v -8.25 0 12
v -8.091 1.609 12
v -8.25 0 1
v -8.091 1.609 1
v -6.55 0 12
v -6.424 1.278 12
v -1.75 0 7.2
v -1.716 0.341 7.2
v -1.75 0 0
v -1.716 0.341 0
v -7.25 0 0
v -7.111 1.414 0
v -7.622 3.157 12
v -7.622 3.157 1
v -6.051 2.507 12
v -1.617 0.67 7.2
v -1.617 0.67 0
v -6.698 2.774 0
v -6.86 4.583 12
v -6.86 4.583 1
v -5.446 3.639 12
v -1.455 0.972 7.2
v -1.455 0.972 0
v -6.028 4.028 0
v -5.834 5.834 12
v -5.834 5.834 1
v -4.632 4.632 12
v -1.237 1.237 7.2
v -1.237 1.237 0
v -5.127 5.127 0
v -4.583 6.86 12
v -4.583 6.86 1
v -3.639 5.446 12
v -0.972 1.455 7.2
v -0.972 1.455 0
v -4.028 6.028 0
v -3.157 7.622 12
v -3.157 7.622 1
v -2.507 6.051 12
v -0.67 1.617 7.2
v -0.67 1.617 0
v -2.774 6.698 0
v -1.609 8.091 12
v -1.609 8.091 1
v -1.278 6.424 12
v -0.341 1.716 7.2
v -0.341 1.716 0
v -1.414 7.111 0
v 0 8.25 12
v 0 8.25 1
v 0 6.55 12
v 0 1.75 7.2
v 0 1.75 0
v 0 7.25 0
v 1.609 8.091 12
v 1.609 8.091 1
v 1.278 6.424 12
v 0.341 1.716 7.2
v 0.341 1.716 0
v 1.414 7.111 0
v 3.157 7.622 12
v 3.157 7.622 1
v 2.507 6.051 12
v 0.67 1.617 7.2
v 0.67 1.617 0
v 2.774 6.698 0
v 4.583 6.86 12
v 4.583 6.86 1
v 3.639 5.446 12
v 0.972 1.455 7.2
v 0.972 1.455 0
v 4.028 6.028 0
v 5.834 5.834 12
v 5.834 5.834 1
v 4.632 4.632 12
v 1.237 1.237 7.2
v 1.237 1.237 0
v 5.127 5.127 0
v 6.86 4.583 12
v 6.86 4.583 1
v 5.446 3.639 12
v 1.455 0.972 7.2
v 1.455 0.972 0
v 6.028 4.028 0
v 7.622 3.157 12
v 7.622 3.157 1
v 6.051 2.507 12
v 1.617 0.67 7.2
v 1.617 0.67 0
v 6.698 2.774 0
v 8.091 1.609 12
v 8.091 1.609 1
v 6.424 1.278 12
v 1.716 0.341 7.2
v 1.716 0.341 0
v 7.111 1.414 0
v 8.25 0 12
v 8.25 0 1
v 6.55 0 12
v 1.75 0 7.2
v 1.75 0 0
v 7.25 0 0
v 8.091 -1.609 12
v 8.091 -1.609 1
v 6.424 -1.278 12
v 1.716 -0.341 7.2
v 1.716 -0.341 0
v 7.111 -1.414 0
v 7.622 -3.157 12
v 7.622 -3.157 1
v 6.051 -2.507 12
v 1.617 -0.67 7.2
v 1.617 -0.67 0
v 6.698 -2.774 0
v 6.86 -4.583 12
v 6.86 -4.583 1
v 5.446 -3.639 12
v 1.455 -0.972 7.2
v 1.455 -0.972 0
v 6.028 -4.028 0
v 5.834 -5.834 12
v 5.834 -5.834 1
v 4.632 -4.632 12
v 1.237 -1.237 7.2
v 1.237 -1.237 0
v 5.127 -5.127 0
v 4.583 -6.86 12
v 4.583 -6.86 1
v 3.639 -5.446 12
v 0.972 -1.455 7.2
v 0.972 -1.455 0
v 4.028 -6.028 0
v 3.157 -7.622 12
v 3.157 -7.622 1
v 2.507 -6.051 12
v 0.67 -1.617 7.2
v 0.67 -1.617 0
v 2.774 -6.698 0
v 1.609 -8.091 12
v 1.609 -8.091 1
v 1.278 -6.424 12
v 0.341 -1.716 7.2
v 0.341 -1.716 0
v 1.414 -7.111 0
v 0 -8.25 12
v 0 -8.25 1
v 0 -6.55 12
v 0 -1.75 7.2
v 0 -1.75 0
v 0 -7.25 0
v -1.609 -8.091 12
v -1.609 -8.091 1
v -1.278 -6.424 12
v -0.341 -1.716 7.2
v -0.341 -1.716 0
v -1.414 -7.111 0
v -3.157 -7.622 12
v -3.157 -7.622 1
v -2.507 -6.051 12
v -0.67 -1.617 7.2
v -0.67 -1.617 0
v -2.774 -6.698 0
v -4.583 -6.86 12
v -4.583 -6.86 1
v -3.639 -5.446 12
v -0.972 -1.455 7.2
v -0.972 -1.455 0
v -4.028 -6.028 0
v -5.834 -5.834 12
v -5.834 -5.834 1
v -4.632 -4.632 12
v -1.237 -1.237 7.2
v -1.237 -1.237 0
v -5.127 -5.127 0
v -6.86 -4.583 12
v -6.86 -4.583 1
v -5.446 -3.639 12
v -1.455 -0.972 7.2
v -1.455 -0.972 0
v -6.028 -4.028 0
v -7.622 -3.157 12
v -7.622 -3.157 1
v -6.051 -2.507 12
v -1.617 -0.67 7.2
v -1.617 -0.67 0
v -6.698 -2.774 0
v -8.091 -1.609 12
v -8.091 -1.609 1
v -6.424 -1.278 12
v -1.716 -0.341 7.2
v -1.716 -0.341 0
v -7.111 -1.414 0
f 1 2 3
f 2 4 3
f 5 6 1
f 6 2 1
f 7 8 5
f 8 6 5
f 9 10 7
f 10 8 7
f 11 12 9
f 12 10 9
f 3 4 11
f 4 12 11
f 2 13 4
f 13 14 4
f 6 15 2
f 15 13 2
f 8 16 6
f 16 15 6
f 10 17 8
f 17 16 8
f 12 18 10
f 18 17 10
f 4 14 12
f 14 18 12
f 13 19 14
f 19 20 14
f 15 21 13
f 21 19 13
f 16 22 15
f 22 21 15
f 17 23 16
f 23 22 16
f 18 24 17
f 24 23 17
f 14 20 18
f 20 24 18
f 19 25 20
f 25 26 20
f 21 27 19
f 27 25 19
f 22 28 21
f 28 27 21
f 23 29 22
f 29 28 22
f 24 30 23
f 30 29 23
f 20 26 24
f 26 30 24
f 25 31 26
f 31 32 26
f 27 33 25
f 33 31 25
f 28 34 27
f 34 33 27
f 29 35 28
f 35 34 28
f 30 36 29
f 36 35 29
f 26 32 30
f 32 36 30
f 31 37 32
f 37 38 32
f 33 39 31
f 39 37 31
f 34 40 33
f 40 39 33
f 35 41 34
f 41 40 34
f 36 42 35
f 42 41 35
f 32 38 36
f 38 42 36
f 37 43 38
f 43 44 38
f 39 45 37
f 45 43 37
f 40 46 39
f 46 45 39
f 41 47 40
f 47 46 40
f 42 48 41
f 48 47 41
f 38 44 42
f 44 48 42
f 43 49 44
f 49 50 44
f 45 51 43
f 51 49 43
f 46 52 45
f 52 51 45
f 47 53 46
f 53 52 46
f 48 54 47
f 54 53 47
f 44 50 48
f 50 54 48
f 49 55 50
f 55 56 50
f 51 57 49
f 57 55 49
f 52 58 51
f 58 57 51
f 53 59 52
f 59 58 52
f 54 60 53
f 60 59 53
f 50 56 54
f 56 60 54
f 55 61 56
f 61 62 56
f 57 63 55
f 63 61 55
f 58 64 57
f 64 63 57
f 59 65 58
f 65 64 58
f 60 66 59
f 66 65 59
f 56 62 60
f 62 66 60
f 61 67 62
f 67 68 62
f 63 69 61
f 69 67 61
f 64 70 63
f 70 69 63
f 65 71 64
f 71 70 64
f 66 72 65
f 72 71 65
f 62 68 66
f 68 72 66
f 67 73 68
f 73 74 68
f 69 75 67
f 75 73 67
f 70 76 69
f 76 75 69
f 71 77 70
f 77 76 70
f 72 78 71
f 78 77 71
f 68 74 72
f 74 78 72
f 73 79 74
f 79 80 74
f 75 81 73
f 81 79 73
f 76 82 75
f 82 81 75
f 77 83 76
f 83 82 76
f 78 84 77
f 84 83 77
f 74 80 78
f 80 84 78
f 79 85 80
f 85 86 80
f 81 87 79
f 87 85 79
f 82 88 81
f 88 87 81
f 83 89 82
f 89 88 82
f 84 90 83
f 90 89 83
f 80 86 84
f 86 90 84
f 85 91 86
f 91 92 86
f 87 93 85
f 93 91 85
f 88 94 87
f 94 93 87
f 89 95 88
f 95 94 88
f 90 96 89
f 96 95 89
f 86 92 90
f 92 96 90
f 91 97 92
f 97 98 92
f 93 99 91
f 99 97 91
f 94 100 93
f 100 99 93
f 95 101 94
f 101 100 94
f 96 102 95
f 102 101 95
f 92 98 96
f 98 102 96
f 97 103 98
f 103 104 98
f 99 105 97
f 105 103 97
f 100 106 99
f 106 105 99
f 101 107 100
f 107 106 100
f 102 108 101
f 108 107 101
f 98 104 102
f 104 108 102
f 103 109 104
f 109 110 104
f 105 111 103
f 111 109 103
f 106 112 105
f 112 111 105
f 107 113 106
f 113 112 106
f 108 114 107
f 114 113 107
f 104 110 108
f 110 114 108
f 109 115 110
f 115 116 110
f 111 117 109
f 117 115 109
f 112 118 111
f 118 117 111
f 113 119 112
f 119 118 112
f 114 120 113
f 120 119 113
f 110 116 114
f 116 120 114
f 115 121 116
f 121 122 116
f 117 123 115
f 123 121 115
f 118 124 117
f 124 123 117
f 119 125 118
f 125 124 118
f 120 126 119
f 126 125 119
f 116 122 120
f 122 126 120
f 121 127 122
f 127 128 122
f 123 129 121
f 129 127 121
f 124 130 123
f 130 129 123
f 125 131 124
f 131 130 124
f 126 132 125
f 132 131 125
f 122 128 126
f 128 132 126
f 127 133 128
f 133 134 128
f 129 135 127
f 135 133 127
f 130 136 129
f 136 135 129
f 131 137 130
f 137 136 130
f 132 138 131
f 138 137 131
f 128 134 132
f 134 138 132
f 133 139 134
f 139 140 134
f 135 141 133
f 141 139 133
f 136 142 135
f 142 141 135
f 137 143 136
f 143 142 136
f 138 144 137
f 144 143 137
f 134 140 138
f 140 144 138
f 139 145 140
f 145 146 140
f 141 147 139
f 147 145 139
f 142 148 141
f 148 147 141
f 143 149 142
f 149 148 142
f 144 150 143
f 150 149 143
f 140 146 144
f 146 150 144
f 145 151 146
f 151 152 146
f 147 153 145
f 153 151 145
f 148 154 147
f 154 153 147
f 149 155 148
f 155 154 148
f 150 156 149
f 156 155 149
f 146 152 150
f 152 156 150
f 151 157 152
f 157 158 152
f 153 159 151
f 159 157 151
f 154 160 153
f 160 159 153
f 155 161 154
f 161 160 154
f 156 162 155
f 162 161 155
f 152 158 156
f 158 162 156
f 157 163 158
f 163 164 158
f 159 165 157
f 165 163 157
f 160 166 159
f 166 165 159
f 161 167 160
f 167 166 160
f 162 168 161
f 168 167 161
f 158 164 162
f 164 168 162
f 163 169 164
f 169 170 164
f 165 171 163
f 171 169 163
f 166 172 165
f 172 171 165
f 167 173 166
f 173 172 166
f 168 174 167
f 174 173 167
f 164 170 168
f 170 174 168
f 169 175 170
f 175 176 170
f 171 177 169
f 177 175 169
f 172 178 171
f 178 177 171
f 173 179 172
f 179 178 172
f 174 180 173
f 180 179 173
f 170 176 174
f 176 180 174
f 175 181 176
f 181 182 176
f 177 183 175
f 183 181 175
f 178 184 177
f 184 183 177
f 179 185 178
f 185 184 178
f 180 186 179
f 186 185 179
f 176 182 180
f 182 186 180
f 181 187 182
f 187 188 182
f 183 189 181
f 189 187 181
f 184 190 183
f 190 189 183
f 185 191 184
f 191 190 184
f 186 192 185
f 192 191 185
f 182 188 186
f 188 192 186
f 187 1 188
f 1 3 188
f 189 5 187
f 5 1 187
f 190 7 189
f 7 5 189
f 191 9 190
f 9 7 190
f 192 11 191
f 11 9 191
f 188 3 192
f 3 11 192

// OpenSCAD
$fn = 32;

// ----------------------------------------------------------------------
// Form washer: countersunk washer, 16.5 mm outside, 3.5 mm bore
// ----------------------------------------------------------------------

// --- parameters (mm) ---
revolve_angle = 360;      // full turn around the Z axis
profile_points = 6;       // points of the closed outline

profile = [[1.75, 0], [7.25, 0], [8.25, 1], [8.25, 12], [6.55, 12], [1.75, 7.2]];  // single closed polygon, 6 points, counter clockwise

// --- the one profile operation ---
rotate_extrude(angle = revolve_angle) polygon(points = profile);
